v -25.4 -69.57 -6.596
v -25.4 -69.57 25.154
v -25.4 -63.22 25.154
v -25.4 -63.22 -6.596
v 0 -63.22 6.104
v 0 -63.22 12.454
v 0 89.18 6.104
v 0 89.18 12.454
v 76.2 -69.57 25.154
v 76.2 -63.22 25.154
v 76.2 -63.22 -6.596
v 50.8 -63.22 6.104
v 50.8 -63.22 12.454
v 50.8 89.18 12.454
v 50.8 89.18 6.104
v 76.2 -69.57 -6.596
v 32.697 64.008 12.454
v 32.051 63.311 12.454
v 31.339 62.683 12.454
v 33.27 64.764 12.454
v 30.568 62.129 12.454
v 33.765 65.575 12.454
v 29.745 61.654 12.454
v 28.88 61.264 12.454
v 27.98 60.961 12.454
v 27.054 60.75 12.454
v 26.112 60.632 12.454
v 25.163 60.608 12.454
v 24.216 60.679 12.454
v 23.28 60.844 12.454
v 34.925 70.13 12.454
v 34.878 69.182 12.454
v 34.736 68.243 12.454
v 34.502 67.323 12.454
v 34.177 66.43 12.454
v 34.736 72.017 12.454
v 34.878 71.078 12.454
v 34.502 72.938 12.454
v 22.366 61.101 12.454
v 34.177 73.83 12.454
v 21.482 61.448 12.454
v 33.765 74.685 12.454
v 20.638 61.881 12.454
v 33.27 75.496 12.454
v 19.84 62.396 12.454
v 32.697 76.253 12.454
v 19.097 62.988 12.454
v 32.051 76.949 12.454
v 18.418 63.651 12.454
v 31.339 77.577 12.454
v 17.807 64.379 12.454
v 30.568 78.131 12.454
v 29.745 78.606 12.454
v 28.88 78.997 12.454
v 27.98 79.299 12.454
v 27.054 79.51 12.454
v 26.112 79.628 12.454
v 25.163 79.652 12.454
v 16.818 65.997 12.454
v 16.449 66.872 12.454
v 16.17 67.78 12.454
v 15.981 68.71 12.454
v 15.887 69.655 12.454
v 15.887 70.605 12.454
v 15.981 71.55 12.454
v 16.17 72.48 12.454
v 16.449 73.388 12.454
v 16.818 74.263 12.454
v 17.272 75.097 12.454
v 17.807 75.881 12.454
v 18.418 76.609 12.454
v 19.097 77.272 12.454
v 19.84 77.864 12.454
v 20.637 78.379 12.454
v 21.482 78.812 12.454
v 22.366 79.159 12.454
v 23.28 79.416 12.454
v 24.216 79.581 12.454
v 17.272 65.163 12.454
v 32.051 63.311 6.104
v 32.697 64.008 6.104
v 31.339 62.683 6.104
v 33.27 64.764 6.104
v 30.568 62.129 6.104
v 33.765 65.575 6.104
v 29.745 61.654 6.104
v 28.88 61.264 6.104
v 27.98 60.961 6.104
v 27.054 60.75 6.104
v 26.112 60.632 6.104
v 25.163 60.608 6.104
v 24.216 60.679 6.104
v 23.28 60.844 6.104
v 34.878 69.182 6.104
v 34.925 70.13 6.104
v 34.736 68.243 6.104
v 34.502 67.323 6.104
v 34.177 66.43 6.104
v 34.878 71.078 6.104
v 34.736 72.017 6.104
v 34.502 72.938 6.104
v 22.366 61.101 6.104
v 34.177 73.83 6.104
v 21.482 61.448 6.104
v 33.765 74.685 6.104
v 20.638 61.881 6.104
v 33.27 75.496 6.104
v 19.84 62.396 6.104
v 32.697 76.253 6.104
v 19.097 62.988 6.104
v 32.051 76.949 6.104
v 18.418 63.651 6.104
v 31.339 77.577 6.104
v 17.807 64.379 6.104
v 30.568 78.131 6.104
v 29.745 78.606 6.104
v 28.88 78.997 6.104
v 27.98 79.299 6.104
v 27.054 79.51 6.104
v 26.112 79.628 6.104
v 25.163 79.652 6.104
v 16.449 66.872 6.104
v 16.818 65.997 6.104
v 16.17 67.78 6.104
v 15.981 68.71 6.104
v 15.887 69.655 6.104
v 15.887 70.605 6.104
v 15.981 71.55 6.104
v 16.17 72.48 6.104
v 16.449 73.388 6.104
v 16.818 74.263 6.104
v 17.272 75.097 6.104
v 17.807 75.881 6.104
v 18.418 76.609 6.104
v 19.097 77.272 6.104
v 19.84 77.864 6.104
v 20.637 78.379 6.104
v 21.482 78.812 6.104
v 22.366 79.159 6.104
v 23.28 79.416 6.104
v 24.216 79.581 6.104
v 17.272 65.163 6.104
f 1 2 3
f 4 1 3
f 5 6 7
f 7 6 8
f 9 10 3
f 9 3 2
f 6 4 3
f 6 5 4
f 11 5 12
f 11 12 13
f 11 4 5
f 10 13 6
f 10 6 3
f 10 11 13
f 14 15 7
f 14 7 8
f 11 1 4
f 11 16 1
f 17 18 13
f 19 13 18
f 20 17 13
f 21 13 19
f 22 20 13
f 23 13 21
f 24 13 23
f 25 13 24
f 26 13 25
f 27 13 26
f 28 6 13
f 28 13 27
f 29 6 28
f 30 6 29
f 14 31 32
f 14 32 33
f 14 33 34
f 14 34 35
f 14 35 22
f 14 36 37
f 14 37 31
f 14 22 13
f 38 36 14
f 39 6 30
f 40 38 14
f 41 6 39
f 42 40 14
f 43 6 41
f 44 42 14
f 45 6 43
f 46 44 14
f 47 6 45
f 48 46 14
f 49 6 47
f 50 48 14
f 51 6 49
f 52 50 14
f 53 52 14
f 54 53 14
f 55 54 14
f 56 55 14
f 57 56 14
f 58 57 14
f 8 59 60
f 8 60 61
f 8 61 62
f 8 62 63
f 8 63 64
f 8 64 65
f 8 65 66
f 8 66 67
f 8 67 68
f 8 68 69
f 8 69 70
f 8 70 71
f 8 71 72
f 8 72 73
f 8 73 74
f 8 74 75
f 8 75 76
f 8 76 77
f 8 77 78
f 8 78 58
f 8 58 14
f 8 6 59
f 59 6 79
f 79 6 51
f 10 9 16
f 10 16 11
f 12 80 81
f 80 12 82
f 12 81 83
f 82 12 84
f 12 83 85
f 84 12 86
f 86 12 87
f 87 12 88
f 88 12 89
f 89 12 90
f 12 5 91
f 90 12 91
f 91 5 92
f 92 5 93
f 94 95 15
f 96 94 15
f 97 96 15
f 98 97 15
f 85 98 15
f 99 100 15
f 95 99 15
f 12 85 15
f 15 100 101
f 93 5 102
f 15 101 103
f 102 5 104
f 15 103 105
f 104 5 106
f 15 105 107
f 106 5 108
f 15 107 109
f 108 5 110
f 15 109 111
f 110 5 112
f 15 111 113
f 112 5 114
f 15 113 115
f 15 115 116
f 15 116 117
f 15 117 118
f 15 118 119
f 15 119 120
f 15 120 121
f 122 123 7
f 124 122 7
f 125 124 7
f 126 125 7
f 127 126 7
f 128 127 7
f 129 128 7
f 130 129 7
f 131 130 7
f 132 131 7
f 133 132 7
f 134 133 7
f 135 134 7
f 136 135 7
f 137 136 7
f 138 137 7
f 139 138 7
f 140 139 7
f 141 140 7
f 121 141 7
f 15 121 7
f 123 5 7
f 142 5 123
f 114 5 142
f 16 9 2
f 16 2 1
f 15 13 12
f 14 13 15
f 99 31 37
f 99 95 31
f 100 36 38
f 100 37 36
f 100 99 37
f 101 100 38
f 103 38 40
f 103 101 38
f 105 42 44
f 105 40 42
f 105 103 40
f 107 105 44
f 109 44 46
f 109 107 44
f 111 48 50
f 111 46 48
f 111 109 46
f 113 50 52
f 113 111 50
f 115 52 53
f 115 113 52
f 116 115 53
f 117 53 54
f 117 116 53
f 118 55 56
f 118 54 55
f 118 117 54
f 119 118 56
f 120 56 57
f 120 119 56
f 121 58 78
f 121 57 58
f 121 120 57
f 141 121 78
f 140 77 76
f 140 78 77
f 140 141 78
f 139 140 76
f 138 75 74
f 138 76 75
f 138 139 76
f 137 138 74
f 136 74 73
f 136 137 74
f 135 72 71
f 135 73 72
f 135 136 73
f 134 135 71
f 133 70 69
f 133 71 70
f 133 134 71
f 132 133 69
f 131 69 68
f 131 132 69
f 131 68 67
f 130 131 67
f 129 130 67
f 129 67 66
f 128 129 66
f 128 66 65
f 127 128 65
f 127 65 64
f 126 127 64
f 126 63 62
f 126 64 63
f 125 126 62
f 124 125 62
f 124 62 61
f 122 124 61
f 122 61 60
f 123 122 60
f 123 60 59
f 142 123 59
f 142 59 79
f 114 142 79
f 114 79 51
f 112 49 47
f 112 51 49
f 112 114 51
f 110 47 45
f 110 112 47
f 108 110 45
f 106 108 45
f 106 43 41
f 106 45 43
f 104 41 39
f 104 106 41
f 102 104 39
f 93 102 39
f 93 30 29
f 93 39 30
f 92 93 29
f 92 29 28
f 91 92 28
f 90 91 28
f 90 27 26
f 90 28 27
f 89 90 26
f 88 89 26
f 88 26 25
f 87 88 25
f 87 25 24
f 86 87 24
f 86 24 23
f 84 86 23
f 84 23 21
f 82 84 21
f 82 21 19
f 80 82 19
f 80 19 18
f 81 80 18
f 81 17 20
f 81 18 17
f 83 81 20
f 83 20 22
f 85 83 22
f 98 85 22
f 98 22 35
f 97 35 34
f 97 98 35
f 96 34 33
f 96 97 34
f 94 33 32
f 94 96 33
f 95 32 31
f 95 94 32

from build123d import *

# Parameters (mm, degrees)
F0_W          = 152.4
F0_H          = 6.35
F1_DEPTH      = 50.8
F3_DEPTH      = 76.2
F3_DEPTH_BACK = 25.4
F4_R          = 9.525
F5_DEPTH      = 25.155085


with BuildPart() as f1:
    # F0 (on Right) → F1 (new body)
    with BuildSketch(Plane.YZ):
        with Locations((12.980076, 9.279085)):
            Rectangle(F0_W, F0_H)
    extrude(amount=F1_DEPTH)

    # F2 (on Right) → F3 (join, two sides)
    with BuildSketch(Plane.YZ) as f3_sk:
        Polygon((-63.219924, -6.595915), (-63.219924, 12.454085), (-63.219924, 25.154085), (-69.569924, 25.154085), (-69.569924, -6.595915), align=None)
    extrude(amount=F3_DEPTH)
    extrude(f3_sk.sketch, amount=-F3_DEPTH_BACK)

    # F4 (on Top) → F5 (cut, through all)
    with BuildSketch(Plane.XY):
        with Locations((25.4, 70.130076)):
            Circle(F4_R)
    extrude(amount=F5_DEPTH, mode=Mode.SUBTRACT)


solid = f1.part
